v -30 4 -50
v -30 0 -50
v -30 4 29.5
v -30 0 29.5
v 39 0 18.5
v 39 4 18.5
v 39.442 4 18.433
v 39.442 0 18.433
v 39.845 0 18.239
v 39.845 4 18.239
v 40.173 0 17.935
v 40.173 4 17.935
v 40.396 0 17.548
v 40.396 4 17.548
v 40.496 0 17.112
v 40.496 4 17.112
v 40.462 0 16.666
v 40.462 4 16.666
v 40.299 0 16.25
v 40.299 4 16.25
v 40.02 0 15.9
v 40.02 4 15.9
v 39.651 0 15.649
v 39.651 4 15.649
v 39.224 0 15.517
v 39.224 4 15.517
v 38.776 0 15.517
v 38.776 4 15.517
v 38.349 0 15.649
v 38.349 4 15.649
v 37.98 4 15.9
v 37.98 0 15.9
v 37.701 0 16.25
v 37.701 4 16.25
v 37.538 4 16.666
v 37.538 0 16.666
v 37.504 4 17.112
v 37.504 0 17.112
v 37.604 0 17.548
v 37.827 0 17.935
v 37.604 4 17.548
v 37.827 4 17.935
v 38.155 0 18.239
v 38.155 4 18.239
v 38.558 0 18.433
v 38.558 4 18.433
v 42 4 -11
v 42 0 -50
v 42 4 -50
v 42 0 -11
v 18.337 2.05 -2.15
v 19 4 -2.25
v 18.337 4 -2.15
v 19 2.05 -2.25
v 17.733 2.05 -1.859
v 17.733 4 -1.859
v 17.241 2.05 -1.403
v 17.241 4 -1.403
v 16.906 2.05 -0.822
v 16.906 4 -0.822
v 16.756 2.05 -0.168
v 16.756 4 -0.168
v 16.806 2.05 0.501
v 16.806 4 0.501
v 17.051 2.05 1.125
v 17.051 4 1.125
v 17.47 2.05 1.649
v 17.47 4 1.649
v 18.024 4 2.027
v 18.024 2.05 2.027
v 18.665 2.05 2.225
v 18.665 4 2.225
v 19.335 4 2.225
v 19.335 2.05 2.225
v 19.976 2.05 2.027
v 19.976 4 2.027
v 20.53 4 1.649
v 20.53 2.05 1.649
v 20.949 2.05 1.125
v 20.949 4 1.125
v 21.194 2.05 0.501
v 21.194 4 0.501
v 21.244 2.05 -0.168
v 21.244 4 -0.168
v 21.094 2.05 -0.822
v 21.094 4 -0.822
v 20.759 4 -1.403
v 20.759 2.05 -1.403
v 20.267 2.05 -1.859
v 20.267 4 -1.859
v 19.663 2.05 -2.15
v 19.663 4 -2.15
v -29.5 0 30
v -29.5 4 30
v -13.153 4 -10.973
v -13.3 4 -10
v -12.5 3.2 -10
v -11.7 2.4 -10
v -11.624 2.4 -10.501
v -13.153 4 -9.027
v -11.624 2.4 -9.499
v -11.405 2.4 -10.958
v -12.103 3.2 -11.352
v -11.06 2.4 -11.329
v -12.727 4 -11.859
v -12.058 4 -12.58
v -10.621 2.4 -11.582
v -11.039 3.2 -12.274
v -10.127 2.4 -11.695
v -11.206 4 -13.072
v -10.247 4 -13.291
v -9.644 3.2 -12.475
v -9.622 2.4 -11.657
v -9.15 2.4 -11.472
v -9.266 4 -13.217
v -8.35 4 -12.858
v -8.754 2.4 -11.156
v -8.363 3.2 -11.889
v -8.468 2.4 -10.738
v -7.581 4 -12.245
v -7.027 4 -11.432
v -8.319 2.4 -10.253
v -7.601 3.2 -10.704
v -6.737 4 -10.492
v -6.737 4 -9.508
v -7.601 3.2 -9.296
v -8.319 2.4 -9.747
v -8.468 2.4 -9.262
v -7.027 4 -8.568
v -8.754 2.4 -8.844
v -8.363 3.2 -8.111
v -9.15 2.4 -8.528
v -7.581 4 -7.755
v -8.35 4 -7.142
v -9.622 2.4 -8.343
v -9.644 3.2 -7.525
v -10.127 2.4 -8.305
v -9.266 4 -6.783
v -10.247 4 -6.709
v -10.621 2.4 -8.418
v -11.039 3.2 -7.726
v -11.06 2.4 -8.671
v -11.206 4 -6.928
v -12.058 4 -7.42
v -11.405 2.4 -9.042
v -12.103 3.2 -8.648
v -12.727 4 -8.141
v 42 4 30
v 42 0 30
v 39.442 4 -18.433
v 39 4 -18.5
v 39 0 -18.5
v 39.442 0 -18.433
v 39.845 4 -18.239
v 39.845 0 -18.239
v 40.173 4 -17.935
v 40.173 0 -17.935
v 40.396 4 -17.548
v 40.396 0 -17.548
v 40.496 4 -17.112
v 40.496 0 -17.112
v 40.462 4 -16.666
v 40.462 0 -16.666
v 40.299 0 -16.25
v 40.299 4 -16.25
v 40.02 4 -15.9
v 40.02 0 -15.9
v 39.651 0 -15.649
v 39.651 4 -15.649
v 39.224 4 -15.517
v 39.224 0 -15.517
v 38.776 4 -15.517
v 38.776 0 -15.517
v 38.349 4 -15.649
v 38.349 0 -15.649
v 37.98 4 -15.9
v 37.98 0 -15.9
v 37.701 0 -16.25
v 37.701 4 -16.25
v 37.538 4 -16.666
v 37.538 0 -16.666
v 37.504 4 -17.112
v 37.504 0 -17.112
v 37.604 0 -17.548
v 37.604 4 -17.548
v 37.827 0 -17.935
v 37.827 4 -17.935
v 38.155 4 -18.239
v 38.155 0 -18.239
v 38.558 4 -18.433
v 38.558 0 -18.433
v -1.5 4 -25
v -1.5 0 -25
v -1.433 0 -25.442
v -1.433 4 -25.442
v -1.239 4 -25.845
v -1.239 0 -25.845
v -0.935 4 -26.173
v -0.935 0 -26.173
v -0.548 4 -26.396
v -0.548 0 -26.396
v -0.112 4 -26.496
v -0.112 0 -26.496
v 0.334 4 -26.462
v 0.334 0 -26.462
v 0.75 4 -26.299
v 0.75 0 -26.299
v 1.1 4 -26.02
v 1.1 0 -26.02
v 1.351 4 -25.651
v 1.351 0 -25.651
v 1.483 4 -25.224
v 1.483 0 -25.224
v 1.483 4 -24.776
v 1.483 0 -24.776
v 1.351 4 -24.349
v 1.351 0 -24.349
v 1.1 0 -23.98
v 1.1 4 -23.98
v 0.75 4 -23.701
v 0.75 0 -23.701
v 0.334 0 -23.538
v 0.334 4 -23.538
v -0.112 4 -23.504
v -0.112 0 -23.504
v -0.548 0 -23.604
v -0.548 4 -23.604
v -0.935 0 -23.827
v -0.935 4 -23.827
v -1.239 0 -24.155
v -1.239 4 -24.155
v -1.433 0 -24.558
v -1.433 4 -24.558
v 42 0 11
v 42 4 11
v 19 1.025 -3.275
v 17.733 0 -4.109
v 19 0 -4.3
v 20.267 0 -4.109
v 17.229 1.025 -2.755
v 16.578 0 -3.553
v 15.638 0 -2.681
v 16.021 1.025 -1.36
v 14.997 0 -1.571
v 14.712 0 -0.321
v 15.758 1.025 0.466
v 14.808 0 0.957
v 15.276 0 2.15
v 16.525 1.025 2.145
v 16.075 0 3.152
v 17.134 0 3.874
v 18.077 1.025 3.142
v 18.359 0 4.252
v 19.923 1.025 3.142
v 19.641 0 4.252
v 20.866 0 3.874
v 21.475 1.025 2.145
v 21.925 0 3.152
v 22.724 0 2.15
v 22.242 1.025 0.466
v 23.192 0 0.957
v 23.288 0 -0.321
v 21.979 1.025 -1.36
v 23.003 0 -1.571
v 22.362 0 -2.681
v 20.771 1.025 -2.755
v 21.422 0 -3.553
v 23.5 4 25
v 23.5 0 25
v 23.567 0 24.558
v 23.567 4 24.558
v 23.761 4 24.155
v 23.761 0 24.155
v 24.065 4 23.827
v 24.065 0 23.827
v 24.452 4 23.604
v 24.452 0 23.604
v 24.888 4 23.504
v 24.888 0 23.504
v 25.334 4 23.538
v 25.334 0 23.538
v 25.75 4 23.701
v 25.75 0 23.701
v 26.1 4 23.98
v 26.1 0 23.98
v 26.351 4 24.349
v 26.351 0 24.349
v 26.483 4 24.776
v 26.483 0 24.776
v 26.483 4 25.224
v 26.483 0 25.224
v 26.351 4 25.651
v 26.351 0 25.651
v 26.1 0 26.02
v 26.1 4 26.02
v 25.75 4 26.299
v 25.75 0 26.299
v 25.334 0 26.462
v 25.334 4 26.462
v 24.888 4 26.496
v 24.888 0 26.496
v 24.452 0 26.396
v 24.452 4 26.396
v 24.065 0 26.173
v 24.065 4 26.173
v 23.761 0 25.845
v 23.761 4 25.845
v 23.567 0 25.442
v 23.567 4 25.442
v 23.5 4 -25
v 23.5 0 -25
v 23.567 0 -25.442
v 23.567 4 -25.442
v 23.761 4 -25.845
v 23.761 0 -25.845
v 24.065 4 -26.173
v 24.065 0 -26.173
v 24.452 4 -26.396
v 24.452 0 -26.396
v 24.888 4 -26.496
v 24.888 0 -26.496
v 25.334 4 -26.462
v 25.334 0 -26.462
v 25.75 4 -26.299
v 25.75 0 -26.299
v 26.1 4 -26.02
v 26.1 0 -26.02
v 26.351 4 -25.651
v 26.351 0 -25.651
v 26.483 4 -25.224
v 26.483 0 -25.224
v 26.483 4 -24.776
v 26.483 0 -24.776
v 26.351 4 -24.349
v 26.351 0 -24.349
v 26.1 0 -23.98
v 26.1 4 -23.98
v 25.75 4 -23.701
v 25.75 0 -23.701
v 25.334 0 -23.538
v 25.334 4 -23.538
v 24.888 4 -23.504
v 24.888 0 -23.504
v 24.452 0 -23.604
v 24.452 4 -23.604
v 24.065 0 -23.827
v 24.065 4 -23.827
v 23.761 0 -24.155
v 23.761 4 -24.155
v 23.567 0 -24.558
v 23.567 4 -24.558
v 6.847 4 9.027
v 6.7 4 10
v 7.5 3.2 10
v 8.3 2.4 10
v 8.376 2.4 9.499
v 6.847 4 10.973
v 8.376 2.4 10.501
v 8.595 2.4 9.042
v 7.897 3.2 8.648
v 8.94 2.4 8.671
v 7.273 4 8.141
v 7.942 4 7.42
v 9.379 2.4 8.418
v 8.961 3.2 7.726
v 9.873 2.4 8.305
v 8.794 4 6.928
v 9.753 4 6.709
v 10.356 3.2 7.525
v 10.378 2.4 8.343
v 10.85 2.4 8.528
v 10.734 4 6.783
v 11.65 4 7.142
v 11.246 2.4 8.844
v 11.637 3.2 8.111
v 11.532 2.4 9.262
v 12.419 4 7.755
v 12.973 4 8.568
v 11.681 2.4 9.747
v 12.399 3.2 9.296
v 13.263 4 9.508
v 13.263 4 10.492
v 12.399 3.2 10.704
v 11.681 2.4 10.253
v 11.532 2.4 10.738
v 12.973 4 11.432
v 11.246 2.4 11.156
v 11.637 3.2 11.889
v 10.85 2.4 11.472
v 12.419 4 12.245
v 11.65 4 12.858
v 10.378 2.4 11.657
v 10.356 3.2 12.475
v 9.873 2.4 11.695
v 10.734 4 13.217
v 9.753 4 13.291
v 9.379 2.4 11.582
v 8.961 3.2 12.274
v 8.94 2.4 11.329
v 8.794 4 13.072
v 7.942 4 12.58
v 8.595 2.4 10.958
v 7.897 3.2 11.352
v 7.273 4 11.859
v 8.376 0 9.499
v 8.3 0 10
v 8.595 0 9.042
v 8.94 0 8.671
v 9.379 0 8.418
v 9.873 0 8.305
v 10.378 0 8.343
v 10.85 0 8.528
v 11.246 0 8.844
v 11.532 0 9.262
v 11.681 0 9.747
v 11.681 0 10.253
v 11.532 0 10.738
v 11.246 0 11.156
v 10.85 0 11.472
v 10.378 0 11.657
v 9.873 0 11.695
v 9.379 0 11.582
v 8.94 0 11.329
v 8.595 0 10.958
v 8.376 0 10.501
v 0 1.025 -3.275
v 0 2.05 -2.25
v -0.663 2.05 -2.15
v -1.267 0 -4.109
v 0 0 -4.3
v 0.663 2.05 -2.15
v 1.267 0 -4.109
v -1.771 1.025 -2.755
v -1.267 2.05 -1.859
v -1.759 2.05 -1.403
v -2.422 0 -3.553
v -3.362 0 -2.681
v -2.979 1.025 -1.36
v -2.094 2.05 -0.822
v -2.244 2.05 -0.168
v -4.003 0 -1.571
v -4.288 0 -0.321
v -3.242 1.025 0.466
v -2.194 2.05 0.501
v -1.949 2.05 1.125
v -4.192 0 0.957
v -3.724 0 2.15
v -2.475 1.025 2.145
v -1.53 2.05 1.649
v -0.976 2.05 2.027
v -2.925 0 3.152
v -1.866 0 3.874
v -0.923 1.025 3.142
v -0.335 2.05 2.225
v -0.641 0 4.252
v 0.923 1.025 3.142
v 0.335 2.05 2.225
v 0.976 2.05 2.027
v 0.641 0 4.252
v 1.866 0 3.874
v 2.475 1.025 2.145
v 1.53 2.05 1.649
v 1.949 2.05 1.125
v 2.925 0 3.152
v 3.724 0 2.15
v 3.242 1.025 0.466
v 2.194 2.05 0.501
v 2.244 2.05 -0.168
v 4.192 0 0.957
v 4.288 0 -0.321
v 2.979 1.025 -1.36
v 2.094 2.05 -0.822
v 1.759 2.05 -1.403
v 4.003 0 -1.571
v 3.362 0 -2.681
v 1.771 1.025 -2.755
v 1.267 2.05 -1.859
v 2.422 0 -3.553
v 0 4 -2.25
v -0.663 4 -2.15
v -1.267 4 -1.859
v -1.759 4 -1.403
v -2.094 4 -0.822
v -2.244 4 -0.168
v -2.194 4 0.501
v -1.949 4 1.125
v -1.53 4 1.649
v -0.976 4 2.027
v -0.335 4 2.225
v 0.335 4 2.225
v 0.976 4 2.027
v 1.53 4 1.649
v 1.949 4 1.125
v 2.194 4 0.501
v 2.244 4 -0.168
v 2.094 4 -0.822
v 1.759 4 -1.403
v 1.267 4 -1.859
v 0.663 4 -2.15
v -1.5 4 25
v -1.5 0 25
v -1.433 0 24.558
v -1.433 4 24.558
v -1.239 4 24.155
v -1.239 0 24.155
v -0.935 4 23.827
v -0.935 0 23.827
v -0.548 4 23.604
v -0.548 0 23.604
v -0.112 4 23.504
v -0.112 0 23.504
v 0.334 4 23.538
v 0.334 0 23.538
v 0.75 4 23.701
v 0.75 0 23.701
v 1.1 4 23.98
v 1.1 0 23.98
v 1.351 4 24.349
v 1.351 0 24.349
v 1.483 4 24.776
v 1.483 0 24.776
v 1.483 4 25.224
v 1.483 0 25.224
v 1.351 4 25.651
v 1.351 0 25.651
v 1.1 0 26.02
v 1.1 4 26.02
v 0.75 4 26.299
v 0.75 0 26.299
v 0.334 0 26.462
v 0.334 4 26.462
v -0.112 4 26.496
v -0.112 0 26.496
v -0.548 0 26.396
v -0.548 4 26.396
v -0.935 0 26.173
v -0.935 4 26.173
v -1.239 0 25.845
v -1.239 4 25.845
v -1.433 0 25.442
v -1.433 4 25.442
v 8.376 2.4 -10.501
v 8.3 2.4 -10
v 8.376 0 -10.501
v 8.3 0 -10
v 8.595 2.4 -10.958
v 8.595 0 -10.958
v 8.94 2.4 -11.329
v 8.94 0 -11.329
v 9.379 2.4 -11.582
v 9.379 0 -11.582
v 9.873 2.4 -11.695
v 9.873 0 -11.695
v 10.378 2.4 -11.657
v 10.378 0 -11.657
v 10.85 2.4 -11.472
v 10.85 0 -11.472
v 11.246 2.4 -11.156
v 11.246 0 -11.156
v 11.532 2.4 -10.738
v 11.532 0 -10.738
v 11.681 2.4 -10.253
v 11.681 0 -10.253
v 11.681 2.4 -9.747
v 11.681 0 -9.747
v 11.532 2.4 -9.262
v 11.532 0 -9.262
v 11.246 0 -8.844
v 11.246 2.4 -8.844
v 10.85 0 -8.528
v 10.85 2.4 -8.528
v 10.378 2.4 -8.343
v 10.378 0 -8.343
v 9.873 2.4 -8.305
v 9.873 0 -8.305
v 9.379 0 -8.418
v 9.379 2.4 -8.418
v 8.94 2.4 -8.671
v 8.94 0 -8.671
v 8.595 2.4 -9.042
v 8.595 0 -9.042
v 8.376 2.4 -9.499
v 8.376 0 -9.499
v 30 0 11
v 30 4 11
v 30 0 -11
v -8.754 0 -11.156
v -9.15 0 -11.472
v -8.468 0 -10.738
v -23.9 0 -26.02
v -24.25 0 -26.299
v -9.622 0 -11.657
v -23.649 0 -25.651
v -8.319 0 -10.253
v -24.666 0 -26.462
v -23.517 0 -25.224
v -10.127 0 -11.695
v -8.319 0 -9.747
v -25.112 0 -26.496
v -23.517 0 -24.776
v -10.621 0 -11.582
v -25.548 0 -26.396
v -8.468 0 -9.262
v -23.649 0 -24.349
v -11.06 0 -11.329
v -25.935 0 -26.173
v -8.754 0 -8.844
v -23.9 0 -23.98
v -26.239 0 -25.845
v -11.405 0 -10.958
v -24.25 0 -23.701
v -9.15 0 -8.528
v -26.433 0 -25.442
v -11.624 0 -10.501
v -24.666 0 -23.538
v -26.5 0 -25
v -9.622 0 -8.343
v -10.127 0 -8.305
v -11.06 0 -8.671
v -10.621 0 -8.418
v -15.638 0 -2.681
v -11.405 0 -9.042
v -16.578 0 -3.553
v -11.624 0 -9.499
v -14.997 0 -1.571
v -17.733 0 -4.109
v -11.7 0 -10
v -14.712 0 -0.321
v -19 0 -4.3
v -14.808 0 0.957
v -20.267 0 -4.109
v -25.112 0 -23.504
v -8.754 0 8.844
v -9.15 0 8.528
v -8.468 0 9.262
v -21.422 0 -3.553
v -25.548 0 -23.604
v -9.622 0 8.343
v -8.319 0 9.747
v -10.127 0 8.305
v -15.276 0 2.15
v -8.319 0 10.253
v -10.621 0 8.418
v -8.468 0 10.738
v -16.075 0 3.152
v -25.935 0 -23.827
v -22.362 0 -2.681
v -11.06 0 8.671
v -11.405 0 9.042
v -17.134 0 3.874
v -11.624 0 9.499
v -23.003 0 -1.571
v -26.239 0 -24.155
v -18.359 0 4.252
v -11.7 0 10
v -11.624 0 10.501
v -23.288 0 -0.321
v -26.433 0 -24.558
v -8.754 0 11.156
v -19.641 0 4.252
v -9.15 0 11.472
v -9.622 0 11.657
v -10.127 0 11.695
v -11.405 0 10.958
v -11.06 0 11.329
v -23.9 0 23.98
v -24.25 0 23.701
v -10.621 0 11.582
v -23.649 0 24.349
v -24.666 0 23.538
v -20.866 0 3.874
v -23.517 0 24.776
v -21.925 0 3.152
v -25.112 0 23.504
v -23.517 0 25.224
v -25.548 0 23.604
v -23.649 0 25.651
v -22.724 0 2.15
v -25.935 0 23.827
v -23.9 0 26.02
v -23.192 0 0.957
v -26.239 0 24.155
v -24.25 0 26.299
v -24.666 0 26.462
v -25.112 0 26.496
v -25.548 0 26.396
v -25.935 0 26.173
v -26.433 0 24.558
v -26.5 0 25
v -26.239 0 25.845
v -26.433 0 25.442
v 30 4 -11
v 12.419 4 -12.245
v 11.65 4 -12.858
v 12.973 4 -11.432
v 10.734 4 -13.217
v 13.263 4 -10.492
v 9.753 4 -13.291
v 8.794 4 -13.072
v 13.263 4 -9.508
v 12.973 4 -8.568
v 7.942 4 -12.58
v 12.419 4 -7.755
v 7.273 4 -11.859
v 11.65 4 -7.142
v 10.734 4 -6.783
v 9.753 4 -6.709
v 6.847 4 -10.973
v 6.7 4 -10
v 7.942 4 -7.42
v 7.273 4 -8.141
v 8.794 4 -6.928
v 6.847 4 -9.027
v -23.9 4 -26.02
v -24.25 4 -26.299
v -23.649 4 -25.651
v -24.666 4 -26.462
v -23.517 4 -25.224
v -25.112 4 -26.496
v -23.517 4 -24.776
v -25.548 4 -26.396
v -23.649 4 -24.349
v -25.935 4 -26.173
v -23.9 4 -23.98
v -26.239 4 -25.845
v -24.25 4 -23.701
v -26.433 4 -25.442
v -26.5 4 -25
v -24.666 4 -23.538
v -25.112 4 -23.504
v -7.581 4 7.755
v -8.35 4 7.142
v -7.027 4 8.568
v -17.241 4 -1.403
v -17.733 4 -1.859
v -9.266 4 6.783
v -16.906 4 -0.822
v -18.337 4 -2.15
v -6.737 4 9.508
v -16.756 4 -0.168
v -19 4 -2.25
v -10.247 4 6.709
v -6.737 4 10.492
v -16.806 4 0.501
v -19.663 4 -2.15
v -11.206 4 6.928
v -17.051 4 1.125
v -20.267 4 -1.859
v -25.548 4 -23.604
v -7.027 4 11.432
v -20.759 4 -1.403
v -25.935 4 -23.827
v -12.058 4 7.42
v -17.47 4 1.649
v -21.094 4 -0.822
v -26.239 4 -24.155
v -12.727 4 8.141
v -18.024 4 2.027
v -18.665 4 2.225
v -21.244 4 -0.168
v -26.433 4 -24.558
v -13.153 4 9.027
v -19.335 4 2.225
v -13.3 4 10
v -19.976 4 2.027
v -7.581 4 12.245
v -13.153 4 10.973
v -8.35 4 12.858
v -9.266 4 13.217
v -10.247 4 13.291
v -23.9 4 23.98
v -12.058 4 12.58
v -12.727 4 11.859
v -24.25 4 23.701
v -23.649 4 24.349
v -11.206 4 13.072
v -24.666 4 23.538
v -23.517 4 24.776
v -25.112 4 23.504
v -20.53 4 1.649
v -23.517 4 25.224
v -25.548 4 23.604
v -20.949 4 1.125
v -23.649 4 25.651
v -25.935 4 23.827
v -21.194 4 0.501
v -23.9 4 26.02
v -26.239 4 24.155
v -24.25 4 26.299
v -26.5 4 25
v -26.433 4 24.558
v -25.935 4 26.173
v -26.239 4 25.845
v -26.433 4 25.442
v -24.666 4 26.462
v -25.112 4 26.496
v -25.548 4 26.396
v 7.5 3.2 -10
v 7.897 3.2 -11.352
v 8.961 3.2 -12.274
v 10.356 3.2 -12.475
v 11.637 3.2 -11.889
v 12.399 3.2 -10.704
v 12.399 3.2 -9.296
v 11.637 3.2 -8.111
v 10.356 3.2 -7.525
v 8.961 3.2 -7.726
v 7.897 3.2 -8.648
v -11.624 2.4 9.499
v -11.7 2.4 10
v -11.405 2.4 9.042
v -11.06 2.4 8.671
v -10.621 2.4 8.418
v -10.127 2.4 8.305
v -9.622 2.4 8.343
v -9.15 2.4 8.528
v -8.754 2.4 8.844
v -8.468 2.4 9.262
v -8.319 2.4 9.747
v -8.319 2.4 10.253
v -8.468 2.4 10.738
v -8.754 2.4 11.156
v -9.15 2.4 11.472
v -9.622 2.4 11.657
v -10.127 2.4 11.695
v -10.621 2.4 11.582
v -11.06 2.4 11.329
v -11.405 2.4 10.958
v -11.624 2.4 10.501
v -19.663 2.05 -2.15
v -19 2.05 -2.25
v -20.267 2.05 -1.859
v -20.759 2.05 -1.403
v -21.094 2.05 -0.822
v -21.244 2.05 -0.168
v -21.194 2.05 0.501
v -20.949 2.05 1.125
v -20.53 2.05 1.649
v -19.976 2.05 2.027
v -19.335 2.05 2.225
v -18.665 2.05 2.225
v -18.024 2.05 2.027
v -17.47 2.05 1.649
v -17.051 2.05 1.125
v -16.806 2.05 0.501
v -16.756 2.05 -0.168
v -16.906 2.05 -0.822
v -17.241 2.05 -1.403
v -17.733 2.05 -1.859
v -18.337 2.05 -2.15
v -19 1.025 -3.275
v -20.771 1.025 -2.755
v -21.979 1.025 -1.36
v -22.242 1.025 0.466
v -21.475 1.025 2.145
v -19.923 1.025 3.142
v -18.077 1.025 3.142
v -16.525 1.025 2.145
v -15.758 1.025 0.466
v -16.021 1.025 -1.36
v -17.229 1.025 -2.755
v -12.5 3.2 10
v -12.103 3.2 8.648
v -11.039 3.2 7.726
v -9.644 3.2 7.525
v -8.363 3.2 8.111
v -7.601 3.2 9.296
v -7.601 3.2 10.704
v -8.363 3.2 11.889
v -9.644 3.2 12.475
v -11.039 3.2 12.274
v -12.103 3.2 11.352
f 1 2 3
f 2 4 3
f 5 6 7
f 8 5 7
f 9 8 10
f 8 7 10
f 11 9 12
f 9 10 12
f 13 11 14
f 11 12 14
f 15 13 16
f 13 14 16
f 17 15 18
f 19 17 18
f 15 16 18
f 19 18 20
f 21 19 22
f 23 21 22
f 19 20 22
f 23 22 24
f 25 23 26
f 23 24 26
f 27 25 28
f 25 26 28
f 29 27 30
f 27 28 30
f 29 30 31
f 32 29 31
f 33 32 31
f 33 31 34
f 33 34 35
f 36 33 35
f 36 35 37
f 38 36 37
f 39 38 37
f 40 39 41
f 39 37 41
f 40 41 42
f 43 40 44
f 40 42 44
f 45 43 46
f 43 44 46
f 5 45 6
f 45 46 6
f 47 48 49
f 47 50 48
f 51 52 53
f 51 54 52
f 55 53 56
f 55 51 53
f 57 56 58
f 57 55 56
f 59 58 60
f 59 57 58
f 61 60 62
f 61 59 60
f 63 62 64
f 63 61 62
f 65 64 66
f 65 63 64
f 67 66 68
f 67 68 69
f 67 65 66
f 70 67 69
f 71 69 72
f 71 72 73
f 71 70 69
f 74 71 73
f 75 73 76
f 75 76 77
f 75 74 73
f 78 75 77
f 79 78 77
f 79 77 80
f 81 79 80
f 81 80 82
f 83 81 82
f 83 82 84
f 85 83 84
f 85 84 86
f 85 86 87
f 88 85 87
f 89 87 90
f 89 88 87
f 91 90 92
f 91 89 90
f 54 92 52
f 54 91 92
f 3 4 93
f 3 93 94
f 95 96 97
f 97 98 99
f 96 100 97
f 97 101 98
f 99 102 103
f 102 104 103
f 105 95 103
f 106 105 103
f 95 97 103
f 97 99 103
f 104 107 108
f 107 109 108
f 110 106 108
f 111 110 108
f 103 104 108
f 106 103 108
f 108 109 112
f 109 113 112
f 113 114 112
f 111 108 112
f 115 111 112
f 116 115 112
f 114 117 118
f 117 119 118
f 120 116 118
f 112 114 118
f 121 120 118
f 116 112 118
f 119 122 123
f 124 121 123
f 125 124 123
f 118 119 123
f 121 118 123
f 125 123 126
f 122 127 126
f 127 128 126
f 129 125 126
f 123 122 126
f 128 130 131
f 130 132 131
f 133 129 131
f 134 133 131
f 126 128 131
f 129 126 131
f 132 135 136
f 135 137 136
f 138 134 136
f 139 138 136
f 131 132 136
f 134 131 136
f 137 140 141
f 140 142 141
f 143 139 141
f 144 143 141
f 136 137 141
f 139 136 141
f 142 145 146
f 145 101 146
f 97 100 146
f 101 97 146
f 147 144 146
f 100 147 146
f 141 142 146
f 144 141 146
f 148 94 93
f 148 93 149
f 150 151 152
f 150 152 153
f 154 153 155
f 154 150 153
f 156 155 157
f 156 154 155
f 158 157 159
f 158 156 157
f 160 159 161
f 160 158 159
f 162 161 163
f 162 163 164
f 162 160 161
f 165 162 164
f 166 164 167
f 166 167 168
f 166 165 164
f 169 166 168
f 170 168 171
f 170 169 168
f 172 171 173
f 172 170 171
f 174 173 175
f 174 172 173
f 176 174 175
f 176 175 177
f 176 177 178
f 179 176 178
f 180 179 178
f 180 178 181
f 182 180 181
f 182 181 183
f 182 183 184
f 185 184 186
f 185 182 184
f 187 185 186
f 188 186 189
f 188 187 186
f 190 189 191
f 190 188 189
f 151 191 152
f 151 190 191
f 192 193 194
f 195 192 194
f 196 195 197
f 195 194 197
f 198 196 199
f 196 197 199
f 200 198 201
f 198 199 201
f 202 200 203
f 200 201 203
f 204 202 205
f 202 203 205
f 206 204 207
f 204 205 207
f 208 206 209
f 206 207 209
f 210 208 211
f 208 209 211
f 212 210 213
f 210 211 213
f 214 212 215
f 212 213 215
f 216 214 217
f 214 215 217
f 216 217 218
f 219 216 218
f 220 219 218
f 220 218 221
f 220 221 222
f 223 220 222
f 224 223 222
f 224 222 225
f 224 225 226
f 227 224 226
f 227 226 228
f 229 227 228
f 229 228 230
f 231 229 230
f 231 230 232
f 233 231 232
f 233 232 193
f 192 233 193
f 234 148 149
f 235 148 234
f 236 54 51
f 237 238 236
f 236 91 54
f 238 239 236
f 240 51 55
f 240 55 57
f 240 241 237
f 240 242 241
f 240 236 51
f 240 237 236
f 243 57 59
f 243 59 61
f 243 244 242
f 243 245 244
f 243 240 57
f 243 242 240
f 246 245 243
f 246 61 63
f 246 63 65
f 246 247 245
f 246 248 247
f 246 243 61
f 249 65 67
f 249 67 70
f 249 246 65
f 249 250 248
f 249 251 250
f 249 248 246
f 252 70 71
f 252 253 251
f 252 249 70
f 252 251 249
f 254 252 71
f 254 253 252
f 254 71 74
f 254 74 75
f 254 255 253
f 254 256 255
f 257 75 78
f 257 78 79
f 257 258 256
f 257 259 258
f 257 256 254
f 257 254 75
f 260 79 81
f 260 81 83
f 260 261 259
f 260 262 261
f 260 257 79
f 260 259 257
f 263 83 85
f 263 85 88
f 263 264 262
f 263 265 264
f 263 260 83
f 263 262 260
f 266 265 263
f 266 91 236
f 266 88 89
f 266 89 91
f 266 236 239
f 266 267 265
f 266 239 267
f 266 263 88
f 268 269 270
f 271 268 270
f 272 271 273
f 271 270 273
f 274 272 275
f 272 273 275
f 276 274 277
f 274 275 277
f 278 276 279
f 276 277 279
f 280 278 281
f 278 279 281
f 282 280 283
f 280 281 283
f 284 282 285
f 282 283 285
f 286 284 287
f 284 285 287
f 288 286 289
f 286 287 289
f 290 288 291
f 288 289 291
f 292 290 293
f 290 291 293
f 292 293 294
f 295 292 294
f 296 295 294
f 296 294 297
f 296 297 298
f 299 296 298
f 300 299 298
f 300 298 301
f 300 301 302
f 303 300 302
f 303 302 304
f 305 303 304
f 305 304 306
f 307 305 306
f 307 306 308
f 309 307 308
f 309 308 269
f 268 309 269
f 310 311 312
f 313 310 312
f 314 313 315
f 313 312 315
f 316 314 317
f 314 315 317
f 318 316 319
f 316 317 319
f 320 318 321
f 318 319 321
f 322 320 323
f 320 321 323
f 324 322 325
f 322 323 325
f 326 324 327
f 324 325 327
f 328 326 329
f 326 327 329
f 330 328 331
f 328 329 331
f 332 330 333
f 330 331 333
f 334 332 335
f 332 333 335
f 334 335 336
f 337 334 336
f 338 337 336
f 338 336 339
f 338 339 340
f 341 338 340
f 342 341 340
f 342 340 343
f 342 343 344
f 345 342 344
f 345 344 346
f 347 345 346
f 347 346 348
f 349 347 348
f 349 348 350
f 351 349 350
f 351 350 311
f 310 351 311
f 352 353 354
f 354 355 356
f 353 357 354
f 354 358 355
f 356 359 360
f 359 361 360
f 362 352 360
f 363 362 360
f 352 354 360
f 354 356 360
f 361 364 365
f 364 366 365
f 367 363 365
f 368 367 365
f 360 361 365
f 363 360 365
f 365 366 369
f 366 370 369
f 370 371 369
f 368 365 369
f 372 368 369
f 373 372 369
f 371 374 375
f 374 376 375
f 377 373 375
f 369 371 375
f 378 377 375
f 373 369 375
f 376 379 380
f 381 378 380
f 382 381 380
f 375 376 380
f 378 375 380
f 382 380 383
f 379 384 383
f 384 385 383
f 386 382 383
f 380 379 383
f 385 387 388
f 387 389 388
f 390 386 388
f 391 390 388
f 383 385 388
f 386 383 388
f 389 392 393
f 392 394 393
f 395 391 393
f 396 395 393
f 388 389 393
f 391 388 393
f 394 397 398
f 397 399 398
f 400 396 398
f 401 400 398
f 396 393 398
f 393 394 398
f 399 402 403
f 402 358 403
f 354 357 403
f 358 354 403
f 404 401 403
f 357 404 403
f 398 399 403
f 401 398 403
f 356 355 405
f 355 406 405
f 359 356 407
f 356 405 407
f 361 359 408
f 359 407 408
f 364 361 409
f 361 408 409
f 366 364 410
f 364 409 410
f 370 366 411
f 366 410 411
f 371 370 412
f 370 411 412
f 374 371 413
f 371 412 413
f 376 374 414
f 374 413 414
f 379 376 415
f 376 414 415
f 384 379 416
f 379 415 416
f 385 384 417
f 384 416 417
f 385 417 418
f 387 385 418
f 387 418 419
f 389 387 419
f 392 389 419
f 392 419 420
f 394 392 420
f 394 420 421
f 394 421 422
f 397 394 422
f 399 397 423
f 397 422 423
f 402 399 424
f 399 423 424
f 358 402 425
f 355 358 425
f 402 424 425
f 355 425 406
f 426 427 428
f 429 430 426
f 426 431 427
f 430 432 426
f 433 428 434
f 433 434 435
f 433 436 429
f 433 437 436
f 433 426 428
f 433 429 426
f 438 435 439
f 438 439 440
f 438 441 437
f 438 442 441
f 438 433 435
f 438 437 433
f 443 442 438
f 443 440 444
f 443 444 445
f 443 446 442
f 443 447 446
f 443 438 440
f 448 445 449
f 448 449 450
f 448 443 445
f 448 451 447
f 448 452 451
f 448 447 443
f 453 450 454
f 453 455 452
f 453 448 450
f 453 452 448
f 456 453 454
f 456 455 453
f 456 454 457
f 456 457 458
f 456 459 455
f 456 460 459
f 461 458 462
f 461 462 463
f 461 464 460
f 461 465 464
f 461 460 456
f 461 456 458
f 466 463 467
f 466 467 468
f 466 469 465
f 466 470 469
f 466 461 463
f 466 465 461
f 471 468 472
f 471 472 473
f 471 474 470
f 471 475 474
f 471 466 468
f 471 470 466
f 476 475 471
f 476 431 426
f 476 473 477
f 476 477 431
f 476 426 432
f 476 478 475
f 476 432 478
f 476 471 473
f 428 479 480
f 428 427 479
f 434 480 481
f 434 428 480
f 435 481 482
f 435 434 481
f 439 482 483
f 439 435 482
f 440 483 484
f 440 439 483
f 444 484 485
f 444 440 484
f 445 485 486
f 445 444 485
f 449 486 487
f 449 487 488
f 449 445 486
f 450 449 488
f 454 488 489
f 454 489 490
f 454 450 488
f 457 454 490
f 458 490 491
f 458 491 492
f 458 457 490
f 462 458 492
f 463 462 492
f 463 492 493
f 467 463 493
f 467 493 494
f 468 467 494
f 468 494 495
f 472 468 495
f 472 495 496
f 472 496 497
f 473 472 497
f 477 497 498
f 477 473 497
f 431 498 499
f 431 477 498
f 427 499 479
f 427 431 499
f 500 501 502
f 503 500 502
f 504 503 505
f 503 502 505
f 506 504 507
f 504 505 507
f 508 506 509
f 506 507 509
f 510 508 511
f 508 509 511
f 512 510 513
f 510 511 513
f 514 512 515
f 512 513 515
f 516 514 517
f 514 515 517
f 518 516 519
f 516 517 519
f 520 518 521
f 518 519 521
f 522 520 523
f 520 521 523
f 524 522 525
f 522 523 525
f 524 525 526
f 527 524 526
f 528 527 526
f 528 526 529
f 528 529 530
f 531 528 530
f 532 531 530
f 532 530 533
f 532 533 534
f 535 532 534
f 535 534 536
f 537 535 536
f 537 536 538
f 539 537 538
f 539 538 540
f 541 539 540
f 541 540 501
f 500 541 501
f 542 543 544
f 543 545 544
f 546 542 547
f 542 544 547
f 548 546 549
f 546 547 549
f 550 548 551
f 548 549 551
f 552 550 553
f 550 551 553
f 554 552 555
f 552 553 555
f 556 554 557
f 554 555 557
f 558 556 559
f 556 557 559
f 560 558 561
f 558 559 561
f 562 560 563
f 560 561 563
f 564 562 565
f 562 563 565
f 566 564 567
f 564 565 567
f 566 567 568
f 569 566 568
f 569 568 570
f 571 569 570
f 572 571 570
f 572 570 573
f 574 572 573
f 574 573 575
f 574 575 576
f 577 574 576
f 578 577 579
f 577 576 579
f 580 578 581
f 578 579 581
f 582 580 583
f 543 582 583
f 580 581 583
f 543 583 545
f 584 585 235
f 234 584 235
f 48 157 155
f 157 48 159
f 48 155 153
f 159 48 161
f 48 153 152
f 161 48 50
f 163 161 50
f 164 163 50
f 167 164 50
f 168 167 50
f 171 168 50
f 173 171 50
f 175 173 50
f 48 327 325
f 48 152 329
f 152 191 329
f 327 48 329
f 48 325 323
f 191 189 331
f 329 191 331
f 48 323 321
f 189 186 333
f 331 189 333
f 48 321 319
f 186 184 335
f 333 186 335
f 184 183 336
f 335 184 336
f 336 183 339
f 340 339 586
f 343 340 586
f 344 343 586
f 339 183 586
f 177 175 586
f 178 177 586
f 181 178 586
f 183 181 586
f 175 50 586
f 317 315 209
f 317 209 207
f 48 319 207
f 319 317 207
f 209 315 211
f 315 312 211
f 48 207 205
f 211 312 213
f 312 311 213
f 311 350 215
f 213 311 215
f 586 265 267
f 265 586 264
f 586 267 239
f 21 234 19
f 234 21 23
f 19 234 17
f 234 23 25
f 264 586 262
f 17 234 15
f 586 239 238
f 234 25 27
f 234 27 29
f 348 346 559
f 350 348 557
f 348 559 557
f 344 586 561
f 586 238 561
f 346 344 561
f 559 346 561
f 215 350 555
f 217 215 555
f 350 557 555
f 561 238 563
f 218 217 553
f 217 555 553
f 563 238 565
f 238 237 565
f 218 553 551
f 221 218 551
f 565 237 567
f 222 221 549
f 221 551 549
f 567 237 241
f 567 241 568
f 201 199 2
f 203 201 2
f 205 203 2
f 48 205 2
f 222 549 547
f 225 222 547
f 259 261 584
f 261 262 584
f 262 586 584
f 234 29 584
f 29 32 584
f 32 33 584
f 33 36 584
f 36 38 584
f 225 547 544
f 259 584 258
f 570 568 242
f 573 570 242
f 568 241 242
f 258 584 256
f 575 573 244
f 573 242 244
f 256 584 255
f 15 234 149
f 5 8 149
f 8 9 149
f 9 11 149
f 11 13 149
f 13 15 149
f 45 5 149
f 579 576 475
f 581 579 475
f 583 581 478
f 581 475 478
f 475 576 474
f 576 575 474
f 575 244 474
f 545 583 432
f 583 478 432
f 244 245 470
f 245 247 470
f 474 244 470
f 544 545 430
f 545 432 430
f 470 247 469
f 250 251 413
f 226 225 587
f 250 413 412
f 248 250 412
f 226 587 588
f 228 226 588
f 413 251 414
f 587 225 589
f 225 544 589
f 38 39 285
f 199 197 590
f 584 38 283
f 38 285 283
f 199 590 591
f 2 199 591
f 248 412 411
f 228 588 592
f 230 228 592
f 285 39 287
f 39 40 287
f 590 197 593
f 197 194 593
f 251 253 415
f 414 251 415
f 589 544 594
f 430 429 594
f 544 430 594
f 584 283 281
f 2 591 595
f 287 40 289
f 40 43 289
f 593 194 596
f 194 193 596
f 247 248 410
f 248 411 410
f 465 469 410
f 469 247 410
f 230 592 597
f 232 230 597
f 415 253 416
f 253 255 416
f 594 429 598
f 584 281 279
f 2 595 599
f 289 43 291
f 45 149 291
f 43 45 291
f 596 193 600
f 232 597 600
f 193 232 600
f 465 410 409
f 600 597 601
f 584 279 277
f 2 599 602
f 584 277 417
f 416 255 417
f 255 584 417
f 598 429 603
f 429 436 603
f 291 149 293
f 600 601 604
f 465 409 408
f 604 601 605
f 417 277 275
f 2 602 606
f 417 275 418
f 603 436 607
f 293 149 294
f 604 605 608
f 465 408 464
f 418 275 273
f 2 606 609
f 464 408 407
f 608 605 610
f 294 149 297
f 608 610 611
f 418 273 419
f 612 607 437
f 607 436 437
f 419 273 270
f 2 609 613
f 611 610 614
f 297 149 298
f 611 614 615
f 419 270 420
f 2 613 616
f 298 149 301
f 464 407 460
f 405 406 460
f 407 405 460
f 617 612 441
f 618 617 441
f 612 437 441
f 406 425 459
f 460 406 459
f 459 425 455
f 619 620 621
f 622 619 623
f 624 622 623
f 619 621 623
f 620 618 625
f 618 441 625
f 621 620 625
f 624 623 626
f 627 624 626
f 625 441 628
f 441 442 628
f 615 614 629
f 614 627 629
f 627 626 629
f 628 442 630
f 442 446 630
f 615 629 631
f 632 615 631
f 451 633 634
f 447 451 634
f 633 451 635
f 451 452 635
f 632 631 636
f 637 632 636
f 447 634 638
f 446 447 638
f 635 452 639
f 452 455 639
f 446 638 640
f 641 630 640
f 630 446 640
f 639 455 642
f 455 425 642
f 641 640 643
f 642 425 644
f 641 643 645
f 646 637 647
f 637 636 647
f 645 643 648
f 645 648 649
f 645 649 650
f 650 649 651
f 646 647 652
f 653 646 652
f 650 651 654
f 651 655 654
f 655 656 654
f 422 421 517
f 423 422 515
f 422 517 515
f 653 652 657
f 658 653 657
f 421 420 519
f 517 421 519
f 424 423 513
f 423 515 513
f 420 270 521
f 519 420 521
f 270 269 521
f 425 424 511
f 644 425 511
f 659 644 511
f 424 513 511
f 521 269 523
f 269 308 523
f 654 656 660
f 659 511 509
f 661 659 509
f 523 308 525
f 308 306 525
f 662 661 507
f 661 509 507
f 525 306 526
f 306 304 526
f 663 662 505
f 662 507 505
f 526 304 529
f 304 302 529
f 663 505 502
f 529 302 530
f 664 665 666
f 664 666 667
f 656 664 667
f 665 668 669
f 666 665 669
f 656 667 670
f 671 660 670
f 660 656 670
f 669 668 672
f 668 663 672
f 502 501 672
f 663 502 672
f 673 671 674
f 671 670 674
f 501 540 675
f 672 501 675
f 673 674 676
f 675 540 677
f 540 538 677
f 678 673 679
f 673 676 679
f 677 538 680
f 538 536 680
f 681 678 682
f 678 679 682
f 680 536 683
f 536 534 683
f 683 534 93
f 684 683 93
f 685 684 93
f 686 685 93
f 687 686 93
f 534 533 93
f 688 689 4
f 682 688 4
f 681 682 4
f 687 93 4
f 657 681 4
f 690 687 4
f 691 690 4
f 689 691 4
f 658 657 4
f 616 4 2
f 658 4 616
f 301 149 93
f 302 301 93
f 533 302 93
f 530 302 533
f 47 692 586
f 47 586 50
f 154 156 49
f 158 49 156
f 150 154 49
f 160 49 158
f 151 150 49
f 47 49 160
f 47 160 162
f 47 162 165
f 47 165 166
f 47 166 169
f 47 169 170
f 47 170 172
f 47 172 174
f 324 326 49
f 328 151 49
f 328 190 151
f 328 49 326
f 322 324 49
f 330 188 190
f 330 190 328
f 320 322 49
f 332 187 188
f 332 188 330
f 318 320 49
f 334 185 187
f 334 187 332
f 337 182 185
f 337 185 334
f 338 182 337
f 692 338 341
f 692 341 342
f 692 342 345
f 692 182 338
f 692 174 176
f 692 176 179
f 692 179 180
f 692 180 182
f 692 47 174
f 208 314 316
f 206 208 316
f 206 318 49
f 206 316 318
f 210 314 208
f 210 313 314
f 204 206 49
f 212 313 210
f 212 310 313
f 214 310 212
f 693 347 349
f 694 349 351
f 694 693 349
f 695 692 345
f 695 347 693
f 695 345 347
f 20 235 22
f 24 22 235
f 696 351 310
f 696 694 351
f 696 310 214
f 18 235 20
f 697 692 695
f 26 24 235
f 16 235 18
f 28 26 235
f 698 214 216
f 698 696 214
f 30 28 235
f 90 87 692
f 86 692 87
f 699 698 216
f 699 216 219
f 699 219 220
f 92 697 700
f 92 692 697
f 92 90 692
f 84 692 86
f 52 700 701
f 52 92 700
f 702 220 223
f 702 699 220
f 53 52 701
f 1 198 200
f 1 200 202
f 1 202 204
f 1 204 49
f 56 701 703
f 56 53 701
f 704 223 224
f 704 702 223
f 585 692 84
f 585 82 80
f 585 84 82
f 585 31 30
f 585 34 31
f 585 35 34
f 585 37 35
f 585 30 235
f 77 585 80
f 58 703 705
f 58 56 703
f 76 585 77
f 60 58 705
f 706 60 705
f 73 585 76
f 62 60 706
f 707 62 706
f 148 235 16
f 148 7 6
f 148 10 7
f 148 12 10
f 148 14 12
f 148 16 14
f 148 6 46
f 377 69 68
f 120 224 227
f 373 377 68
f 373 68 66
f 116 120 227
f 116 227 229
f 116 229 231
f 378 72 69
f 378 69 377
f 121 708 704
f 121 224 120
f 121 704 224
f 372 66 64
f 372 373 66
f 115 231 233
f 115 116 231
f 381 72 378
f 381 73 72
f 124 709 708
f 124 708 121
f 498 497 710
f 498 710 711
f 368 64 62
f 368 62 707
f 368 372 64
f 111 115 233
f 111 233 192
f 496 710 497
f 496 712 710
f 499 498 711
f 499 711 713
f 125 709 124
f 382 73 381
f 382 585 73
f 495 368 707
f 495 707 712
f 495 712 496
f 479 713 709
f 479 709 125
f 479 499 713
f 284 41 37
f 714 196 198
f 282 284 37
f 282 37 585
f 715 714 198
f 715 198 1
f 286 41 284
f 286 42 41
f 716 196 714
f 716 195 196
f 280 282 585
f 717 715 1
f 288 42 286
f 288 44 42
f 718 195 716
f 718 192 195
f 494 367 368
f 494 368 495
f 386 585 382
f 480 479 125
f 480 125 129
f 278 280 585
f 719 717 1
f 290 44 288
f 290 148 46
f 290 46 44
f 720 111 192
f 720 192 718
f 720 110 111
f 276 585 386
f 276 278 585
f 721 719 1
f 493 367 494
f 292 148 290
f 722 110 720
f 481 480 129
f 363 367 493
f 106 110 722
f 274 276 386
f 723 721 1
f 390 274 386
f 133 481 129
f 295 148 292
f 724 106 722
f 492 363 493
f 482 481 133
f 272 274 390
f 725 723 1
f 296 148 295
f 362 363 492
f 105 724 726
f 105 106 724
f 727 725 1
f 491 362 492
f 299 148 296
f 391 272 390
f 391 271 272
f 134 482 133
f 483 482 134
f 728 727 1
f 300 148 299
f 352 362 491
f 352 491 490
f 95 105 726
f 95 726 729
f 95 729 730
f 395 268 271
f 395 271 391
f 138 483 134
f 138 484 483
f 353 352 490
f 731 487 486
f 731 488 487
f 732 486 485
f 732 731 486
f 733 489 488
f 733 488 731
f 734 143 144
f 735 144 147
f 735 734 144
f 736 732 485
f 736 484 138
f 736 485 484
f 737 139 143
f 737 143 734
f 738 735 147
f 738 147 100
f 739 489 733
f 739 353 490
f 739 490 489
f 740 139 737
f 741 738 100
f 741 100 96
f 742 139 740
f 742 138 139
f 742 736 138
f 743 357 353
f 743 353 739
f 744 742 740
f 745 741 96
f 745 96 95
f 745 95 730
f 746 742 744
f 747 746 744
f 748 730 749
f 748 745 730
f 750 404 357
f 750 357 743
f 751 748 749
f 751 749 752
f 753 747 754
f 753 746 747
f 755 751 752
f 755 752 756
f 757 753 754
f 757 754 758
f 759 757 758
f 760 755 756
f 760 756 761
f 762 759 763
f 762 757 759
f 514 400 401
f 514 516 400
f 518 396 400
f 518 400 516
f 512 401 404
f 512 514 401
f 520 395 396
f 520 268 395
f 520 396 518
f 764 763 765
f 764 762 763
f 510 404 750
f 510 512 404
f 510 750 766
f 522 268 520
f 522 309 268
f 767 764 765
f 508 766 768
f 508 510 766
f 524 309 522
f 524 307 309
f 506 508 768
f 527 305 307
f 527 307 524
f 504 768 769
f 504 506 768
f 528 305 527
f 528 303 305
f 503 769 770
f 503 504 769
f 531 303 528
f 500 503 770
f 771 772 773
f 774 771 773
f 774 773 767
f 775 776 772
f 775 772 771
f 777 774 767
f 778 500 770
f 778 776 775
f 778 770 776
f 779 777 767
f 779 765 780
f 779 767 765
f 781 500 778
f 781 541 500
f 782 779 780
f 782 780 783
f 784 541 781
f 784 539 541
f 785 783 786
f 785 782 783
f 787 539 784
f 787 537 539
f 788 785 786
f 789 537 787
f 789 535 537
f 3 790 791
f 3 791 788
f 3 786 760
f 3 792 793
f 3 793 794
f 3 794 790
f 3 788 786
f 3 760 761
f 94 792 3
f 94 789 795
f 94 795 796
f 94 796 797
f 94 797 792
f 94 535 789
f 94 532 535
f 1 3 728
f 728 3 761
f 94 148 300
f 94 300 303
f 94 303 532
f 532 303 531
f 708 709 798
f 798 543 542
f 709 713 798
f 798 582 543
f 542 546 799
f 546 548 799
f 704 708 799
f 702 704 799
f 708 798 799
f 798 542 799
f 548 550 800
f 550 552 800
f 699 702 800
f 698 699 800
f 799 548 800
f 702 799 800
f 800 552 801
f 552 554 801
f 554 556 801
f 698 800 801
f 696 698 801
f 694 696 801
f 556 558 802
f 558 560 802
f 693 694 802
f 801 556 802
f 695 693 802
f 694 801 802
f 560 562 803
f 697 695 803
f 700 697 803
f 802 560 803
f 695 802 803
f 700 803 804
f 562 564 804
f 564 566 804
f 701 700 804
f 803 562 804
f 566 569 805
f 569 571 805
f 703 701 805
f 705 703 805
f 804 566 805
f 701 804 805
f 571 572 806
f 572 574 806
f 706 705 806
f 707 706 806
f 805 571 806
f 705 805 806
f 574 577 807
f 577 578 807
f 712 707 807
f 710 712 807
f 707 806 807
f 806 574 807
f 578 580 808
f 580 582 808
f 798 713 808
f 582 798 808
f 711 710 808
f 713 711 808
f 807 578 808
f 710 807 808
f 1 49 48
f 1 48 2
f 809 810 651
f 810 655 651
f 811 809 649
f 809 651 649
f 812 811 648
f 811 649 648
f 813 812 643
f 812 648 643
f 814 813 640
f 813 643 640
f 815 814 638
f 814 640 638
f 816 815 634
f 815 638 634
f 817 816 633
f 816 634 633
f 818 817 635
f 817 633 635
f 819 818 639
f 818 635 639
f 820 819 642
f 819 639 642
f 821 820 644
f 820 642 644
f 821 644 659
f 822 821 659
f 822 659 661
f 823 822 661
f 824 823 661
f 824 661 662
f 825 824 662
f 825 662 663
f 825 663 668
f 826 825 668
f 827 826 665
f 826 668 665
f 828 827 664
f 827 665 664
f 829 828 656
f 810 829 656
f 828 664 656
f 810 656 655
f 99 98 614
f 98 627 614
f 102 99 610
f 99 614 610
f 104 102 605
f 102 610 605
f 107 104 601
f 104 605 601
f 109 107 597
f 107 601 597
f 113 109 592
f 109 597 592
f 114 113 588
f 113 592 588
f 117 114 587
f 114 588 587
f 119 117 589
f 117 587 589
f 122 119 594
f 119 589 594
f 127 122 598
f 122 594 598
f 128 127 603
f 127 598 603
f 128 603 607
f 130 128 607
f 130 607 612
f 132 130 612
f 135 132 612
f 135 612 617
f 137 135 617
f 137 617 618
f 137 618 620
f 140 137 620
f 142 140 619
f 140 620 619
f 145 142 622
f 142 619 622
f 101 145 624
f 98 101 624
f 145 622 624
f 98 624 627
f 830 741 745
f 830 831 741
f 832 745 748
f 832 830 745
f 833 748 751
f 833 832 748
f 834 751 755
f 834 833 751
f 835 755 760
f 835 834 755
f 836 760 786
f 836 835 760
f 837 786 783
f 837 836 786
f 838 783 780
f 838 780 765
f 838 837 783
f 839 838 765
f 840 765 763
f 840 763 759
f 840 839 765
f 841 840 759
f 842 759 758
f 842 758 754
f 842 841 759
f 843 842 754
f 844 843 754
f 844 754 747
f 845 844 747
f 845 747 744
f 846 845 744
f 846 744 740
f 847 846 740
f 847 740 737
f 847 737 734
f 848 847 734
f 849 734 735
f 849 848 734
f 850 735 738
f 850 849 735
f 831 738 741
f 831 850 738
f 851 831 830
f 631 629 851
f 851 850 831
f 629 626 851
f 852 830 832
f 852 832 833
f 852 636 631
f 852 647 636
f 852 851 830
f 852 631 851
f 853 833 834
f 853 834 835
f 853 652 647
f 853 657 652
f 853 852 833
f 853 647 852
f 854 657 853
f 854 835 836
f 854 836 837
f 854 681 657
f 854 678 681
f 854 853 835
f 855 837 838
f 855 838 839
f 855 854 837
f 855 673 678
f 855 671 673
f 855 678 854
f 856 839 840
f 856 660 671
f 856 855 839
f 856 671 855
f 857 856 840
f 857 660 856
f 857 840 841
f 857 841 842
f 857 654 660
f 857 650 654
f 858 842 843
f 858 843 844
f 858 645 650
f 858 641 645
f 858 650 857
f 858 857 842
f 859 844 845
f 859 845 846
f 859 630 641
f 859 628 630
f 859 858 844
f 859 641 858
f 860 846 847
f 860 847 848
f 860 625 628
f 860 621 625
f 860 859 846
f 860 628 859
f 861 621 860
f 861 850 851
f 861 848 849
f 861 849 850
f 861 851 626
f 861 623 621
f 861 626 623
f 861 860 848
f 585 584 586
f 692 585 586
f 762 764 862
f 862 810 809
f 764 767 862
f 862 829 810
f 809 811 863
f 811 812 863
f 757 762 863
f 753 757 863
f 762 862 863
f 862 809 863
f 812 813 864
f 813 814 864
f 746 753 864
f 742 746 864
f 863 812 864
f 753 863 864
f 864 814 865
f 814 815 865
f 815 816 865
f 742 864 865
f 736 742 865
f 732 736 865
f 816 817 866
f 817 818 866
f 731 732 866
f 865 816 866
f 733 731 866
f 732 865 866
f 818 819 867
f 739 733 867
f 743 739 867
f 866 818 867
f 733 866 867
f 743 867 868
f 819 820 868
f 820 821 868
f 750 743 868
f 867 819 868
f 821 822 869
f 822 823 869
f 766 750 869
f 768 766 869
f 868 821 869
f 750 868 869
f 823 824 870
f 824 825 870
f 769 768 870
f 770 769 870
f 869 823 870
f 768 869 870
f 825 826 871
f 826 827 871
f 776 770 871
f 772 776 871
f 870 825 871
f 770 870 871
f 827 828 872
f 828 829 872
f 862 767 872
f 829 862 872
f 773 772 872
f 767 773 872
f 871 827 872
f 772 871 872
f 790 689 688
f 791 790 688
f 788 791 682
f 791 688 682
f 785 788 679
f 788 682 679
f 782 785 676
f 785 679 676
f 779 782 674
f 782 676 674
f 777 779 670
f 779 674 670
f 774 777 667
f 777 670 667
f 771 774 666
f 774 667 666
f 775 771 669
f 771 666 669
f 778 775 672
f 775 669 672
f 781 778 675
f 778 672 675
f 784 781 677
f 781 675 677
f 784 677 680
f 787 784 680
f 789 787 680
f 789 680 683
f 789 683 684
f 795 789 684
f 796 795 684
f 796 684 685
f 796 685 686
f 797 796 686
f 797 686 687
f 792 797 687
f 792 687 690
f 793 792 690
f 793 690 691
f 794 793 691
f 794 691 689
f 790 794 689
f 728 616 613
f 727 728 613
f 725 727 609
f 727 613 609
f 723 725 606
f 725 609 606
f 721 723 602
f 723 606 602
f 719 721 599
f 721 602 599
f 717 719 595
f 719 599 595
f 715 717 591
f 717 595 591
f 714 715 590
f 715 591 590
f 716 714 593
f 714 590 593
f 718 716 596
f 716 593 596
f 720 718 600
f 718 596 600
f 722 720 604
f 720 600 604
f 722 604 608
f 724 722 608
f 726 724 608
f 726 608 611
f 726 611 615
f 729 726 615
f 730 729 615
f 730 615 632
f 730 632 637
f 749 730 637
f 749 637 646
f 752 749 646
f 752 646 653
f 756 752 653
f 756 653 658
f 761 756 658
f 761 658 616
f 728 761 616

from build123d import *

# Parameters (mm, degrees)
SKETCH_1_W                   = 60
SKETCH_1_H                   = 60
EXTRUDE_1_DEPTH              = 4
HOLE_WIZARD_M3_1_D           = 3.4
HOLE_WIZARD_M3_1_CSINK_D     = 6.6
HOLE_WIZARD_M3_1_CSINK_ANGLE = 90
HOLE_WIZARD_M4_1_AT_2_COUNT  = 2
HOLE_WIZARD_M4_1_AT_2_PITCH  = 19
HOLE_WIZARD_M4_1_AT_3_COUNT  = 2
HOLE_WIZARD_M4_1_AT_3_PITCH  = 38
HOLE_WIZARD_1_D              = 3
SKETCH_9_W                   = 12
SKETCH_9_H                   = 19
SKETCH_9_R                   = 1.5
EXTRUDE_3_DEPTH              = 4
CHAMFER_1_SIZE               = 0.5
SKETCH_10_W                  = 72
SKETCH_10_H                  = 4
EXTRUDE_4_DEPTH              = 20


with BuildPart() as part:
    # 草图1 → 凸台-拉伸1 (new body)
    with BuildSketch(Plane(origin=(0, 0, 0), x_dir=(1, 0, 0), z_dir=(0, 1, 0))):
        Rectangle(SKETCH_1_W, SKETCH_1_H)
    extrude(amount=EXTRUDE_1_DEPTH)

    # M3 十字槽沉头木螺钉的锥形沉头孔1 (through all)
    with Locations(Plane(origin=(0, 4, 0), x_dir=(1, 0, 0), z_dir=(0, 1, 0))):
        with Locations((-10, 10), (10, 10), (10, -10), (-10, -10)):
            CounterSinkHole(HOLE_WIZARD_M3_1_D / 2, HOLE_WIZARD_M3_1_CSINK_D / 2, counter_sink_angle=HOLE_WIZARD_M3_1_CSINK_ANGLE)

    # 草图5 → M4 十字槽沉头木螺钉的锥形沉头孔1 (revolve, cut)
    with BuildSketch(Plane(origin=(-19, 0, 0), x_dir=(0, 0, -1), z_dir=(1, 0, 0))):
        Polygon((0, 0), (0, 4), (2.25, 4), (2.25, 2.05), (4.3, 0), align=None)
    hole_wizard_m4_1 = revolve(axis=Axis((-19, -6.35, 0), (0, 1, 0)), mode=Mode.SUBTRACT)

    # M4 十字槽沉头木螺钉的锥形沉头孔1 at 2: M4 十字槽沉头木螺钉的锥形沉头孔1 ×2
    with Locations(*[(i * HOLE_WIZARD_M4_1_AT_2_PITCH, 0, 0) for i in range(1, HOLE_WIZARD_M4_1_AT_2_COUNT)]):
        add(hole_wizard_m4_1, mode=Mode.SUBTRACT)

    # M4 十字槽沉头木螺钉的锥形沉头孔1 at 3: M4 十字槽沉头木螺钉的锥形沉头孔1 ×2
    with Locations(*[(i * HOLE_WIZARD_M4_1_AT_3_PITCH, 0, 0) for i in range(1, HOLE_WIZARD_M4_1_AT_3_COUNT)]):
        add(hole_wizard_m4_1, mode=Mode.SUBTRACT)

    # 孔1 (through all)
    with Locations(Plane(origin=(0, 4, 0), x_dir=(1, 0, 0), z_dir=(0, 1, 0))):
        with Locations((25, 25), (25, -25), (0, -25), (-25, -25), (-25, 25), (0, 25)):
            Hole(HOLE_WIZARD_1_D / 2)

    # 草图9 → 凸台-拉伸3 (add)
    with BuildSketch(Plane(origin=(0, 4, 0), x_dir=(1, 0, 0), z_dir=(0, 1, 0))):
        with Locations((36, -20.5)):
            Rectangle(SKETCH_9_W, SKETCH_9_H)
        with Locations(Location((39, -17, 0), (0, 0, 270))):
            Circle(SKETCH_9_R, mode=Mode.SUBTRACT)
    extrude_3 = extrude(amount=-EXTRUDE_3_DEPTH)

    # 倒角1
    chamfer_1_edges = [part.edges().sort_by_distance(p)[0] for p in [
        (-30, 2, 30),
    ]]
    chamfer(chamfer_1_edges, length=CHAMFER_1_SIZE)

    # 镜向1: 凸台-拉伸3 across plane
    add(extrude_3.mirror(Plane.XY))

    # 草图10 → 凸台-拉伸4 (add)
    with BuildSketch(Plane(origin=(0, 0, -30), x_dir=(-1, 0, 0), z_dir=(0, 0, -1))):
        with Locations((-6, 2)):
            Rectangle(SKETCH_10_W, SKETCH_10_H)
    extrude(amount=EXTRUDE_4_DEPTH)


solid = part.part
